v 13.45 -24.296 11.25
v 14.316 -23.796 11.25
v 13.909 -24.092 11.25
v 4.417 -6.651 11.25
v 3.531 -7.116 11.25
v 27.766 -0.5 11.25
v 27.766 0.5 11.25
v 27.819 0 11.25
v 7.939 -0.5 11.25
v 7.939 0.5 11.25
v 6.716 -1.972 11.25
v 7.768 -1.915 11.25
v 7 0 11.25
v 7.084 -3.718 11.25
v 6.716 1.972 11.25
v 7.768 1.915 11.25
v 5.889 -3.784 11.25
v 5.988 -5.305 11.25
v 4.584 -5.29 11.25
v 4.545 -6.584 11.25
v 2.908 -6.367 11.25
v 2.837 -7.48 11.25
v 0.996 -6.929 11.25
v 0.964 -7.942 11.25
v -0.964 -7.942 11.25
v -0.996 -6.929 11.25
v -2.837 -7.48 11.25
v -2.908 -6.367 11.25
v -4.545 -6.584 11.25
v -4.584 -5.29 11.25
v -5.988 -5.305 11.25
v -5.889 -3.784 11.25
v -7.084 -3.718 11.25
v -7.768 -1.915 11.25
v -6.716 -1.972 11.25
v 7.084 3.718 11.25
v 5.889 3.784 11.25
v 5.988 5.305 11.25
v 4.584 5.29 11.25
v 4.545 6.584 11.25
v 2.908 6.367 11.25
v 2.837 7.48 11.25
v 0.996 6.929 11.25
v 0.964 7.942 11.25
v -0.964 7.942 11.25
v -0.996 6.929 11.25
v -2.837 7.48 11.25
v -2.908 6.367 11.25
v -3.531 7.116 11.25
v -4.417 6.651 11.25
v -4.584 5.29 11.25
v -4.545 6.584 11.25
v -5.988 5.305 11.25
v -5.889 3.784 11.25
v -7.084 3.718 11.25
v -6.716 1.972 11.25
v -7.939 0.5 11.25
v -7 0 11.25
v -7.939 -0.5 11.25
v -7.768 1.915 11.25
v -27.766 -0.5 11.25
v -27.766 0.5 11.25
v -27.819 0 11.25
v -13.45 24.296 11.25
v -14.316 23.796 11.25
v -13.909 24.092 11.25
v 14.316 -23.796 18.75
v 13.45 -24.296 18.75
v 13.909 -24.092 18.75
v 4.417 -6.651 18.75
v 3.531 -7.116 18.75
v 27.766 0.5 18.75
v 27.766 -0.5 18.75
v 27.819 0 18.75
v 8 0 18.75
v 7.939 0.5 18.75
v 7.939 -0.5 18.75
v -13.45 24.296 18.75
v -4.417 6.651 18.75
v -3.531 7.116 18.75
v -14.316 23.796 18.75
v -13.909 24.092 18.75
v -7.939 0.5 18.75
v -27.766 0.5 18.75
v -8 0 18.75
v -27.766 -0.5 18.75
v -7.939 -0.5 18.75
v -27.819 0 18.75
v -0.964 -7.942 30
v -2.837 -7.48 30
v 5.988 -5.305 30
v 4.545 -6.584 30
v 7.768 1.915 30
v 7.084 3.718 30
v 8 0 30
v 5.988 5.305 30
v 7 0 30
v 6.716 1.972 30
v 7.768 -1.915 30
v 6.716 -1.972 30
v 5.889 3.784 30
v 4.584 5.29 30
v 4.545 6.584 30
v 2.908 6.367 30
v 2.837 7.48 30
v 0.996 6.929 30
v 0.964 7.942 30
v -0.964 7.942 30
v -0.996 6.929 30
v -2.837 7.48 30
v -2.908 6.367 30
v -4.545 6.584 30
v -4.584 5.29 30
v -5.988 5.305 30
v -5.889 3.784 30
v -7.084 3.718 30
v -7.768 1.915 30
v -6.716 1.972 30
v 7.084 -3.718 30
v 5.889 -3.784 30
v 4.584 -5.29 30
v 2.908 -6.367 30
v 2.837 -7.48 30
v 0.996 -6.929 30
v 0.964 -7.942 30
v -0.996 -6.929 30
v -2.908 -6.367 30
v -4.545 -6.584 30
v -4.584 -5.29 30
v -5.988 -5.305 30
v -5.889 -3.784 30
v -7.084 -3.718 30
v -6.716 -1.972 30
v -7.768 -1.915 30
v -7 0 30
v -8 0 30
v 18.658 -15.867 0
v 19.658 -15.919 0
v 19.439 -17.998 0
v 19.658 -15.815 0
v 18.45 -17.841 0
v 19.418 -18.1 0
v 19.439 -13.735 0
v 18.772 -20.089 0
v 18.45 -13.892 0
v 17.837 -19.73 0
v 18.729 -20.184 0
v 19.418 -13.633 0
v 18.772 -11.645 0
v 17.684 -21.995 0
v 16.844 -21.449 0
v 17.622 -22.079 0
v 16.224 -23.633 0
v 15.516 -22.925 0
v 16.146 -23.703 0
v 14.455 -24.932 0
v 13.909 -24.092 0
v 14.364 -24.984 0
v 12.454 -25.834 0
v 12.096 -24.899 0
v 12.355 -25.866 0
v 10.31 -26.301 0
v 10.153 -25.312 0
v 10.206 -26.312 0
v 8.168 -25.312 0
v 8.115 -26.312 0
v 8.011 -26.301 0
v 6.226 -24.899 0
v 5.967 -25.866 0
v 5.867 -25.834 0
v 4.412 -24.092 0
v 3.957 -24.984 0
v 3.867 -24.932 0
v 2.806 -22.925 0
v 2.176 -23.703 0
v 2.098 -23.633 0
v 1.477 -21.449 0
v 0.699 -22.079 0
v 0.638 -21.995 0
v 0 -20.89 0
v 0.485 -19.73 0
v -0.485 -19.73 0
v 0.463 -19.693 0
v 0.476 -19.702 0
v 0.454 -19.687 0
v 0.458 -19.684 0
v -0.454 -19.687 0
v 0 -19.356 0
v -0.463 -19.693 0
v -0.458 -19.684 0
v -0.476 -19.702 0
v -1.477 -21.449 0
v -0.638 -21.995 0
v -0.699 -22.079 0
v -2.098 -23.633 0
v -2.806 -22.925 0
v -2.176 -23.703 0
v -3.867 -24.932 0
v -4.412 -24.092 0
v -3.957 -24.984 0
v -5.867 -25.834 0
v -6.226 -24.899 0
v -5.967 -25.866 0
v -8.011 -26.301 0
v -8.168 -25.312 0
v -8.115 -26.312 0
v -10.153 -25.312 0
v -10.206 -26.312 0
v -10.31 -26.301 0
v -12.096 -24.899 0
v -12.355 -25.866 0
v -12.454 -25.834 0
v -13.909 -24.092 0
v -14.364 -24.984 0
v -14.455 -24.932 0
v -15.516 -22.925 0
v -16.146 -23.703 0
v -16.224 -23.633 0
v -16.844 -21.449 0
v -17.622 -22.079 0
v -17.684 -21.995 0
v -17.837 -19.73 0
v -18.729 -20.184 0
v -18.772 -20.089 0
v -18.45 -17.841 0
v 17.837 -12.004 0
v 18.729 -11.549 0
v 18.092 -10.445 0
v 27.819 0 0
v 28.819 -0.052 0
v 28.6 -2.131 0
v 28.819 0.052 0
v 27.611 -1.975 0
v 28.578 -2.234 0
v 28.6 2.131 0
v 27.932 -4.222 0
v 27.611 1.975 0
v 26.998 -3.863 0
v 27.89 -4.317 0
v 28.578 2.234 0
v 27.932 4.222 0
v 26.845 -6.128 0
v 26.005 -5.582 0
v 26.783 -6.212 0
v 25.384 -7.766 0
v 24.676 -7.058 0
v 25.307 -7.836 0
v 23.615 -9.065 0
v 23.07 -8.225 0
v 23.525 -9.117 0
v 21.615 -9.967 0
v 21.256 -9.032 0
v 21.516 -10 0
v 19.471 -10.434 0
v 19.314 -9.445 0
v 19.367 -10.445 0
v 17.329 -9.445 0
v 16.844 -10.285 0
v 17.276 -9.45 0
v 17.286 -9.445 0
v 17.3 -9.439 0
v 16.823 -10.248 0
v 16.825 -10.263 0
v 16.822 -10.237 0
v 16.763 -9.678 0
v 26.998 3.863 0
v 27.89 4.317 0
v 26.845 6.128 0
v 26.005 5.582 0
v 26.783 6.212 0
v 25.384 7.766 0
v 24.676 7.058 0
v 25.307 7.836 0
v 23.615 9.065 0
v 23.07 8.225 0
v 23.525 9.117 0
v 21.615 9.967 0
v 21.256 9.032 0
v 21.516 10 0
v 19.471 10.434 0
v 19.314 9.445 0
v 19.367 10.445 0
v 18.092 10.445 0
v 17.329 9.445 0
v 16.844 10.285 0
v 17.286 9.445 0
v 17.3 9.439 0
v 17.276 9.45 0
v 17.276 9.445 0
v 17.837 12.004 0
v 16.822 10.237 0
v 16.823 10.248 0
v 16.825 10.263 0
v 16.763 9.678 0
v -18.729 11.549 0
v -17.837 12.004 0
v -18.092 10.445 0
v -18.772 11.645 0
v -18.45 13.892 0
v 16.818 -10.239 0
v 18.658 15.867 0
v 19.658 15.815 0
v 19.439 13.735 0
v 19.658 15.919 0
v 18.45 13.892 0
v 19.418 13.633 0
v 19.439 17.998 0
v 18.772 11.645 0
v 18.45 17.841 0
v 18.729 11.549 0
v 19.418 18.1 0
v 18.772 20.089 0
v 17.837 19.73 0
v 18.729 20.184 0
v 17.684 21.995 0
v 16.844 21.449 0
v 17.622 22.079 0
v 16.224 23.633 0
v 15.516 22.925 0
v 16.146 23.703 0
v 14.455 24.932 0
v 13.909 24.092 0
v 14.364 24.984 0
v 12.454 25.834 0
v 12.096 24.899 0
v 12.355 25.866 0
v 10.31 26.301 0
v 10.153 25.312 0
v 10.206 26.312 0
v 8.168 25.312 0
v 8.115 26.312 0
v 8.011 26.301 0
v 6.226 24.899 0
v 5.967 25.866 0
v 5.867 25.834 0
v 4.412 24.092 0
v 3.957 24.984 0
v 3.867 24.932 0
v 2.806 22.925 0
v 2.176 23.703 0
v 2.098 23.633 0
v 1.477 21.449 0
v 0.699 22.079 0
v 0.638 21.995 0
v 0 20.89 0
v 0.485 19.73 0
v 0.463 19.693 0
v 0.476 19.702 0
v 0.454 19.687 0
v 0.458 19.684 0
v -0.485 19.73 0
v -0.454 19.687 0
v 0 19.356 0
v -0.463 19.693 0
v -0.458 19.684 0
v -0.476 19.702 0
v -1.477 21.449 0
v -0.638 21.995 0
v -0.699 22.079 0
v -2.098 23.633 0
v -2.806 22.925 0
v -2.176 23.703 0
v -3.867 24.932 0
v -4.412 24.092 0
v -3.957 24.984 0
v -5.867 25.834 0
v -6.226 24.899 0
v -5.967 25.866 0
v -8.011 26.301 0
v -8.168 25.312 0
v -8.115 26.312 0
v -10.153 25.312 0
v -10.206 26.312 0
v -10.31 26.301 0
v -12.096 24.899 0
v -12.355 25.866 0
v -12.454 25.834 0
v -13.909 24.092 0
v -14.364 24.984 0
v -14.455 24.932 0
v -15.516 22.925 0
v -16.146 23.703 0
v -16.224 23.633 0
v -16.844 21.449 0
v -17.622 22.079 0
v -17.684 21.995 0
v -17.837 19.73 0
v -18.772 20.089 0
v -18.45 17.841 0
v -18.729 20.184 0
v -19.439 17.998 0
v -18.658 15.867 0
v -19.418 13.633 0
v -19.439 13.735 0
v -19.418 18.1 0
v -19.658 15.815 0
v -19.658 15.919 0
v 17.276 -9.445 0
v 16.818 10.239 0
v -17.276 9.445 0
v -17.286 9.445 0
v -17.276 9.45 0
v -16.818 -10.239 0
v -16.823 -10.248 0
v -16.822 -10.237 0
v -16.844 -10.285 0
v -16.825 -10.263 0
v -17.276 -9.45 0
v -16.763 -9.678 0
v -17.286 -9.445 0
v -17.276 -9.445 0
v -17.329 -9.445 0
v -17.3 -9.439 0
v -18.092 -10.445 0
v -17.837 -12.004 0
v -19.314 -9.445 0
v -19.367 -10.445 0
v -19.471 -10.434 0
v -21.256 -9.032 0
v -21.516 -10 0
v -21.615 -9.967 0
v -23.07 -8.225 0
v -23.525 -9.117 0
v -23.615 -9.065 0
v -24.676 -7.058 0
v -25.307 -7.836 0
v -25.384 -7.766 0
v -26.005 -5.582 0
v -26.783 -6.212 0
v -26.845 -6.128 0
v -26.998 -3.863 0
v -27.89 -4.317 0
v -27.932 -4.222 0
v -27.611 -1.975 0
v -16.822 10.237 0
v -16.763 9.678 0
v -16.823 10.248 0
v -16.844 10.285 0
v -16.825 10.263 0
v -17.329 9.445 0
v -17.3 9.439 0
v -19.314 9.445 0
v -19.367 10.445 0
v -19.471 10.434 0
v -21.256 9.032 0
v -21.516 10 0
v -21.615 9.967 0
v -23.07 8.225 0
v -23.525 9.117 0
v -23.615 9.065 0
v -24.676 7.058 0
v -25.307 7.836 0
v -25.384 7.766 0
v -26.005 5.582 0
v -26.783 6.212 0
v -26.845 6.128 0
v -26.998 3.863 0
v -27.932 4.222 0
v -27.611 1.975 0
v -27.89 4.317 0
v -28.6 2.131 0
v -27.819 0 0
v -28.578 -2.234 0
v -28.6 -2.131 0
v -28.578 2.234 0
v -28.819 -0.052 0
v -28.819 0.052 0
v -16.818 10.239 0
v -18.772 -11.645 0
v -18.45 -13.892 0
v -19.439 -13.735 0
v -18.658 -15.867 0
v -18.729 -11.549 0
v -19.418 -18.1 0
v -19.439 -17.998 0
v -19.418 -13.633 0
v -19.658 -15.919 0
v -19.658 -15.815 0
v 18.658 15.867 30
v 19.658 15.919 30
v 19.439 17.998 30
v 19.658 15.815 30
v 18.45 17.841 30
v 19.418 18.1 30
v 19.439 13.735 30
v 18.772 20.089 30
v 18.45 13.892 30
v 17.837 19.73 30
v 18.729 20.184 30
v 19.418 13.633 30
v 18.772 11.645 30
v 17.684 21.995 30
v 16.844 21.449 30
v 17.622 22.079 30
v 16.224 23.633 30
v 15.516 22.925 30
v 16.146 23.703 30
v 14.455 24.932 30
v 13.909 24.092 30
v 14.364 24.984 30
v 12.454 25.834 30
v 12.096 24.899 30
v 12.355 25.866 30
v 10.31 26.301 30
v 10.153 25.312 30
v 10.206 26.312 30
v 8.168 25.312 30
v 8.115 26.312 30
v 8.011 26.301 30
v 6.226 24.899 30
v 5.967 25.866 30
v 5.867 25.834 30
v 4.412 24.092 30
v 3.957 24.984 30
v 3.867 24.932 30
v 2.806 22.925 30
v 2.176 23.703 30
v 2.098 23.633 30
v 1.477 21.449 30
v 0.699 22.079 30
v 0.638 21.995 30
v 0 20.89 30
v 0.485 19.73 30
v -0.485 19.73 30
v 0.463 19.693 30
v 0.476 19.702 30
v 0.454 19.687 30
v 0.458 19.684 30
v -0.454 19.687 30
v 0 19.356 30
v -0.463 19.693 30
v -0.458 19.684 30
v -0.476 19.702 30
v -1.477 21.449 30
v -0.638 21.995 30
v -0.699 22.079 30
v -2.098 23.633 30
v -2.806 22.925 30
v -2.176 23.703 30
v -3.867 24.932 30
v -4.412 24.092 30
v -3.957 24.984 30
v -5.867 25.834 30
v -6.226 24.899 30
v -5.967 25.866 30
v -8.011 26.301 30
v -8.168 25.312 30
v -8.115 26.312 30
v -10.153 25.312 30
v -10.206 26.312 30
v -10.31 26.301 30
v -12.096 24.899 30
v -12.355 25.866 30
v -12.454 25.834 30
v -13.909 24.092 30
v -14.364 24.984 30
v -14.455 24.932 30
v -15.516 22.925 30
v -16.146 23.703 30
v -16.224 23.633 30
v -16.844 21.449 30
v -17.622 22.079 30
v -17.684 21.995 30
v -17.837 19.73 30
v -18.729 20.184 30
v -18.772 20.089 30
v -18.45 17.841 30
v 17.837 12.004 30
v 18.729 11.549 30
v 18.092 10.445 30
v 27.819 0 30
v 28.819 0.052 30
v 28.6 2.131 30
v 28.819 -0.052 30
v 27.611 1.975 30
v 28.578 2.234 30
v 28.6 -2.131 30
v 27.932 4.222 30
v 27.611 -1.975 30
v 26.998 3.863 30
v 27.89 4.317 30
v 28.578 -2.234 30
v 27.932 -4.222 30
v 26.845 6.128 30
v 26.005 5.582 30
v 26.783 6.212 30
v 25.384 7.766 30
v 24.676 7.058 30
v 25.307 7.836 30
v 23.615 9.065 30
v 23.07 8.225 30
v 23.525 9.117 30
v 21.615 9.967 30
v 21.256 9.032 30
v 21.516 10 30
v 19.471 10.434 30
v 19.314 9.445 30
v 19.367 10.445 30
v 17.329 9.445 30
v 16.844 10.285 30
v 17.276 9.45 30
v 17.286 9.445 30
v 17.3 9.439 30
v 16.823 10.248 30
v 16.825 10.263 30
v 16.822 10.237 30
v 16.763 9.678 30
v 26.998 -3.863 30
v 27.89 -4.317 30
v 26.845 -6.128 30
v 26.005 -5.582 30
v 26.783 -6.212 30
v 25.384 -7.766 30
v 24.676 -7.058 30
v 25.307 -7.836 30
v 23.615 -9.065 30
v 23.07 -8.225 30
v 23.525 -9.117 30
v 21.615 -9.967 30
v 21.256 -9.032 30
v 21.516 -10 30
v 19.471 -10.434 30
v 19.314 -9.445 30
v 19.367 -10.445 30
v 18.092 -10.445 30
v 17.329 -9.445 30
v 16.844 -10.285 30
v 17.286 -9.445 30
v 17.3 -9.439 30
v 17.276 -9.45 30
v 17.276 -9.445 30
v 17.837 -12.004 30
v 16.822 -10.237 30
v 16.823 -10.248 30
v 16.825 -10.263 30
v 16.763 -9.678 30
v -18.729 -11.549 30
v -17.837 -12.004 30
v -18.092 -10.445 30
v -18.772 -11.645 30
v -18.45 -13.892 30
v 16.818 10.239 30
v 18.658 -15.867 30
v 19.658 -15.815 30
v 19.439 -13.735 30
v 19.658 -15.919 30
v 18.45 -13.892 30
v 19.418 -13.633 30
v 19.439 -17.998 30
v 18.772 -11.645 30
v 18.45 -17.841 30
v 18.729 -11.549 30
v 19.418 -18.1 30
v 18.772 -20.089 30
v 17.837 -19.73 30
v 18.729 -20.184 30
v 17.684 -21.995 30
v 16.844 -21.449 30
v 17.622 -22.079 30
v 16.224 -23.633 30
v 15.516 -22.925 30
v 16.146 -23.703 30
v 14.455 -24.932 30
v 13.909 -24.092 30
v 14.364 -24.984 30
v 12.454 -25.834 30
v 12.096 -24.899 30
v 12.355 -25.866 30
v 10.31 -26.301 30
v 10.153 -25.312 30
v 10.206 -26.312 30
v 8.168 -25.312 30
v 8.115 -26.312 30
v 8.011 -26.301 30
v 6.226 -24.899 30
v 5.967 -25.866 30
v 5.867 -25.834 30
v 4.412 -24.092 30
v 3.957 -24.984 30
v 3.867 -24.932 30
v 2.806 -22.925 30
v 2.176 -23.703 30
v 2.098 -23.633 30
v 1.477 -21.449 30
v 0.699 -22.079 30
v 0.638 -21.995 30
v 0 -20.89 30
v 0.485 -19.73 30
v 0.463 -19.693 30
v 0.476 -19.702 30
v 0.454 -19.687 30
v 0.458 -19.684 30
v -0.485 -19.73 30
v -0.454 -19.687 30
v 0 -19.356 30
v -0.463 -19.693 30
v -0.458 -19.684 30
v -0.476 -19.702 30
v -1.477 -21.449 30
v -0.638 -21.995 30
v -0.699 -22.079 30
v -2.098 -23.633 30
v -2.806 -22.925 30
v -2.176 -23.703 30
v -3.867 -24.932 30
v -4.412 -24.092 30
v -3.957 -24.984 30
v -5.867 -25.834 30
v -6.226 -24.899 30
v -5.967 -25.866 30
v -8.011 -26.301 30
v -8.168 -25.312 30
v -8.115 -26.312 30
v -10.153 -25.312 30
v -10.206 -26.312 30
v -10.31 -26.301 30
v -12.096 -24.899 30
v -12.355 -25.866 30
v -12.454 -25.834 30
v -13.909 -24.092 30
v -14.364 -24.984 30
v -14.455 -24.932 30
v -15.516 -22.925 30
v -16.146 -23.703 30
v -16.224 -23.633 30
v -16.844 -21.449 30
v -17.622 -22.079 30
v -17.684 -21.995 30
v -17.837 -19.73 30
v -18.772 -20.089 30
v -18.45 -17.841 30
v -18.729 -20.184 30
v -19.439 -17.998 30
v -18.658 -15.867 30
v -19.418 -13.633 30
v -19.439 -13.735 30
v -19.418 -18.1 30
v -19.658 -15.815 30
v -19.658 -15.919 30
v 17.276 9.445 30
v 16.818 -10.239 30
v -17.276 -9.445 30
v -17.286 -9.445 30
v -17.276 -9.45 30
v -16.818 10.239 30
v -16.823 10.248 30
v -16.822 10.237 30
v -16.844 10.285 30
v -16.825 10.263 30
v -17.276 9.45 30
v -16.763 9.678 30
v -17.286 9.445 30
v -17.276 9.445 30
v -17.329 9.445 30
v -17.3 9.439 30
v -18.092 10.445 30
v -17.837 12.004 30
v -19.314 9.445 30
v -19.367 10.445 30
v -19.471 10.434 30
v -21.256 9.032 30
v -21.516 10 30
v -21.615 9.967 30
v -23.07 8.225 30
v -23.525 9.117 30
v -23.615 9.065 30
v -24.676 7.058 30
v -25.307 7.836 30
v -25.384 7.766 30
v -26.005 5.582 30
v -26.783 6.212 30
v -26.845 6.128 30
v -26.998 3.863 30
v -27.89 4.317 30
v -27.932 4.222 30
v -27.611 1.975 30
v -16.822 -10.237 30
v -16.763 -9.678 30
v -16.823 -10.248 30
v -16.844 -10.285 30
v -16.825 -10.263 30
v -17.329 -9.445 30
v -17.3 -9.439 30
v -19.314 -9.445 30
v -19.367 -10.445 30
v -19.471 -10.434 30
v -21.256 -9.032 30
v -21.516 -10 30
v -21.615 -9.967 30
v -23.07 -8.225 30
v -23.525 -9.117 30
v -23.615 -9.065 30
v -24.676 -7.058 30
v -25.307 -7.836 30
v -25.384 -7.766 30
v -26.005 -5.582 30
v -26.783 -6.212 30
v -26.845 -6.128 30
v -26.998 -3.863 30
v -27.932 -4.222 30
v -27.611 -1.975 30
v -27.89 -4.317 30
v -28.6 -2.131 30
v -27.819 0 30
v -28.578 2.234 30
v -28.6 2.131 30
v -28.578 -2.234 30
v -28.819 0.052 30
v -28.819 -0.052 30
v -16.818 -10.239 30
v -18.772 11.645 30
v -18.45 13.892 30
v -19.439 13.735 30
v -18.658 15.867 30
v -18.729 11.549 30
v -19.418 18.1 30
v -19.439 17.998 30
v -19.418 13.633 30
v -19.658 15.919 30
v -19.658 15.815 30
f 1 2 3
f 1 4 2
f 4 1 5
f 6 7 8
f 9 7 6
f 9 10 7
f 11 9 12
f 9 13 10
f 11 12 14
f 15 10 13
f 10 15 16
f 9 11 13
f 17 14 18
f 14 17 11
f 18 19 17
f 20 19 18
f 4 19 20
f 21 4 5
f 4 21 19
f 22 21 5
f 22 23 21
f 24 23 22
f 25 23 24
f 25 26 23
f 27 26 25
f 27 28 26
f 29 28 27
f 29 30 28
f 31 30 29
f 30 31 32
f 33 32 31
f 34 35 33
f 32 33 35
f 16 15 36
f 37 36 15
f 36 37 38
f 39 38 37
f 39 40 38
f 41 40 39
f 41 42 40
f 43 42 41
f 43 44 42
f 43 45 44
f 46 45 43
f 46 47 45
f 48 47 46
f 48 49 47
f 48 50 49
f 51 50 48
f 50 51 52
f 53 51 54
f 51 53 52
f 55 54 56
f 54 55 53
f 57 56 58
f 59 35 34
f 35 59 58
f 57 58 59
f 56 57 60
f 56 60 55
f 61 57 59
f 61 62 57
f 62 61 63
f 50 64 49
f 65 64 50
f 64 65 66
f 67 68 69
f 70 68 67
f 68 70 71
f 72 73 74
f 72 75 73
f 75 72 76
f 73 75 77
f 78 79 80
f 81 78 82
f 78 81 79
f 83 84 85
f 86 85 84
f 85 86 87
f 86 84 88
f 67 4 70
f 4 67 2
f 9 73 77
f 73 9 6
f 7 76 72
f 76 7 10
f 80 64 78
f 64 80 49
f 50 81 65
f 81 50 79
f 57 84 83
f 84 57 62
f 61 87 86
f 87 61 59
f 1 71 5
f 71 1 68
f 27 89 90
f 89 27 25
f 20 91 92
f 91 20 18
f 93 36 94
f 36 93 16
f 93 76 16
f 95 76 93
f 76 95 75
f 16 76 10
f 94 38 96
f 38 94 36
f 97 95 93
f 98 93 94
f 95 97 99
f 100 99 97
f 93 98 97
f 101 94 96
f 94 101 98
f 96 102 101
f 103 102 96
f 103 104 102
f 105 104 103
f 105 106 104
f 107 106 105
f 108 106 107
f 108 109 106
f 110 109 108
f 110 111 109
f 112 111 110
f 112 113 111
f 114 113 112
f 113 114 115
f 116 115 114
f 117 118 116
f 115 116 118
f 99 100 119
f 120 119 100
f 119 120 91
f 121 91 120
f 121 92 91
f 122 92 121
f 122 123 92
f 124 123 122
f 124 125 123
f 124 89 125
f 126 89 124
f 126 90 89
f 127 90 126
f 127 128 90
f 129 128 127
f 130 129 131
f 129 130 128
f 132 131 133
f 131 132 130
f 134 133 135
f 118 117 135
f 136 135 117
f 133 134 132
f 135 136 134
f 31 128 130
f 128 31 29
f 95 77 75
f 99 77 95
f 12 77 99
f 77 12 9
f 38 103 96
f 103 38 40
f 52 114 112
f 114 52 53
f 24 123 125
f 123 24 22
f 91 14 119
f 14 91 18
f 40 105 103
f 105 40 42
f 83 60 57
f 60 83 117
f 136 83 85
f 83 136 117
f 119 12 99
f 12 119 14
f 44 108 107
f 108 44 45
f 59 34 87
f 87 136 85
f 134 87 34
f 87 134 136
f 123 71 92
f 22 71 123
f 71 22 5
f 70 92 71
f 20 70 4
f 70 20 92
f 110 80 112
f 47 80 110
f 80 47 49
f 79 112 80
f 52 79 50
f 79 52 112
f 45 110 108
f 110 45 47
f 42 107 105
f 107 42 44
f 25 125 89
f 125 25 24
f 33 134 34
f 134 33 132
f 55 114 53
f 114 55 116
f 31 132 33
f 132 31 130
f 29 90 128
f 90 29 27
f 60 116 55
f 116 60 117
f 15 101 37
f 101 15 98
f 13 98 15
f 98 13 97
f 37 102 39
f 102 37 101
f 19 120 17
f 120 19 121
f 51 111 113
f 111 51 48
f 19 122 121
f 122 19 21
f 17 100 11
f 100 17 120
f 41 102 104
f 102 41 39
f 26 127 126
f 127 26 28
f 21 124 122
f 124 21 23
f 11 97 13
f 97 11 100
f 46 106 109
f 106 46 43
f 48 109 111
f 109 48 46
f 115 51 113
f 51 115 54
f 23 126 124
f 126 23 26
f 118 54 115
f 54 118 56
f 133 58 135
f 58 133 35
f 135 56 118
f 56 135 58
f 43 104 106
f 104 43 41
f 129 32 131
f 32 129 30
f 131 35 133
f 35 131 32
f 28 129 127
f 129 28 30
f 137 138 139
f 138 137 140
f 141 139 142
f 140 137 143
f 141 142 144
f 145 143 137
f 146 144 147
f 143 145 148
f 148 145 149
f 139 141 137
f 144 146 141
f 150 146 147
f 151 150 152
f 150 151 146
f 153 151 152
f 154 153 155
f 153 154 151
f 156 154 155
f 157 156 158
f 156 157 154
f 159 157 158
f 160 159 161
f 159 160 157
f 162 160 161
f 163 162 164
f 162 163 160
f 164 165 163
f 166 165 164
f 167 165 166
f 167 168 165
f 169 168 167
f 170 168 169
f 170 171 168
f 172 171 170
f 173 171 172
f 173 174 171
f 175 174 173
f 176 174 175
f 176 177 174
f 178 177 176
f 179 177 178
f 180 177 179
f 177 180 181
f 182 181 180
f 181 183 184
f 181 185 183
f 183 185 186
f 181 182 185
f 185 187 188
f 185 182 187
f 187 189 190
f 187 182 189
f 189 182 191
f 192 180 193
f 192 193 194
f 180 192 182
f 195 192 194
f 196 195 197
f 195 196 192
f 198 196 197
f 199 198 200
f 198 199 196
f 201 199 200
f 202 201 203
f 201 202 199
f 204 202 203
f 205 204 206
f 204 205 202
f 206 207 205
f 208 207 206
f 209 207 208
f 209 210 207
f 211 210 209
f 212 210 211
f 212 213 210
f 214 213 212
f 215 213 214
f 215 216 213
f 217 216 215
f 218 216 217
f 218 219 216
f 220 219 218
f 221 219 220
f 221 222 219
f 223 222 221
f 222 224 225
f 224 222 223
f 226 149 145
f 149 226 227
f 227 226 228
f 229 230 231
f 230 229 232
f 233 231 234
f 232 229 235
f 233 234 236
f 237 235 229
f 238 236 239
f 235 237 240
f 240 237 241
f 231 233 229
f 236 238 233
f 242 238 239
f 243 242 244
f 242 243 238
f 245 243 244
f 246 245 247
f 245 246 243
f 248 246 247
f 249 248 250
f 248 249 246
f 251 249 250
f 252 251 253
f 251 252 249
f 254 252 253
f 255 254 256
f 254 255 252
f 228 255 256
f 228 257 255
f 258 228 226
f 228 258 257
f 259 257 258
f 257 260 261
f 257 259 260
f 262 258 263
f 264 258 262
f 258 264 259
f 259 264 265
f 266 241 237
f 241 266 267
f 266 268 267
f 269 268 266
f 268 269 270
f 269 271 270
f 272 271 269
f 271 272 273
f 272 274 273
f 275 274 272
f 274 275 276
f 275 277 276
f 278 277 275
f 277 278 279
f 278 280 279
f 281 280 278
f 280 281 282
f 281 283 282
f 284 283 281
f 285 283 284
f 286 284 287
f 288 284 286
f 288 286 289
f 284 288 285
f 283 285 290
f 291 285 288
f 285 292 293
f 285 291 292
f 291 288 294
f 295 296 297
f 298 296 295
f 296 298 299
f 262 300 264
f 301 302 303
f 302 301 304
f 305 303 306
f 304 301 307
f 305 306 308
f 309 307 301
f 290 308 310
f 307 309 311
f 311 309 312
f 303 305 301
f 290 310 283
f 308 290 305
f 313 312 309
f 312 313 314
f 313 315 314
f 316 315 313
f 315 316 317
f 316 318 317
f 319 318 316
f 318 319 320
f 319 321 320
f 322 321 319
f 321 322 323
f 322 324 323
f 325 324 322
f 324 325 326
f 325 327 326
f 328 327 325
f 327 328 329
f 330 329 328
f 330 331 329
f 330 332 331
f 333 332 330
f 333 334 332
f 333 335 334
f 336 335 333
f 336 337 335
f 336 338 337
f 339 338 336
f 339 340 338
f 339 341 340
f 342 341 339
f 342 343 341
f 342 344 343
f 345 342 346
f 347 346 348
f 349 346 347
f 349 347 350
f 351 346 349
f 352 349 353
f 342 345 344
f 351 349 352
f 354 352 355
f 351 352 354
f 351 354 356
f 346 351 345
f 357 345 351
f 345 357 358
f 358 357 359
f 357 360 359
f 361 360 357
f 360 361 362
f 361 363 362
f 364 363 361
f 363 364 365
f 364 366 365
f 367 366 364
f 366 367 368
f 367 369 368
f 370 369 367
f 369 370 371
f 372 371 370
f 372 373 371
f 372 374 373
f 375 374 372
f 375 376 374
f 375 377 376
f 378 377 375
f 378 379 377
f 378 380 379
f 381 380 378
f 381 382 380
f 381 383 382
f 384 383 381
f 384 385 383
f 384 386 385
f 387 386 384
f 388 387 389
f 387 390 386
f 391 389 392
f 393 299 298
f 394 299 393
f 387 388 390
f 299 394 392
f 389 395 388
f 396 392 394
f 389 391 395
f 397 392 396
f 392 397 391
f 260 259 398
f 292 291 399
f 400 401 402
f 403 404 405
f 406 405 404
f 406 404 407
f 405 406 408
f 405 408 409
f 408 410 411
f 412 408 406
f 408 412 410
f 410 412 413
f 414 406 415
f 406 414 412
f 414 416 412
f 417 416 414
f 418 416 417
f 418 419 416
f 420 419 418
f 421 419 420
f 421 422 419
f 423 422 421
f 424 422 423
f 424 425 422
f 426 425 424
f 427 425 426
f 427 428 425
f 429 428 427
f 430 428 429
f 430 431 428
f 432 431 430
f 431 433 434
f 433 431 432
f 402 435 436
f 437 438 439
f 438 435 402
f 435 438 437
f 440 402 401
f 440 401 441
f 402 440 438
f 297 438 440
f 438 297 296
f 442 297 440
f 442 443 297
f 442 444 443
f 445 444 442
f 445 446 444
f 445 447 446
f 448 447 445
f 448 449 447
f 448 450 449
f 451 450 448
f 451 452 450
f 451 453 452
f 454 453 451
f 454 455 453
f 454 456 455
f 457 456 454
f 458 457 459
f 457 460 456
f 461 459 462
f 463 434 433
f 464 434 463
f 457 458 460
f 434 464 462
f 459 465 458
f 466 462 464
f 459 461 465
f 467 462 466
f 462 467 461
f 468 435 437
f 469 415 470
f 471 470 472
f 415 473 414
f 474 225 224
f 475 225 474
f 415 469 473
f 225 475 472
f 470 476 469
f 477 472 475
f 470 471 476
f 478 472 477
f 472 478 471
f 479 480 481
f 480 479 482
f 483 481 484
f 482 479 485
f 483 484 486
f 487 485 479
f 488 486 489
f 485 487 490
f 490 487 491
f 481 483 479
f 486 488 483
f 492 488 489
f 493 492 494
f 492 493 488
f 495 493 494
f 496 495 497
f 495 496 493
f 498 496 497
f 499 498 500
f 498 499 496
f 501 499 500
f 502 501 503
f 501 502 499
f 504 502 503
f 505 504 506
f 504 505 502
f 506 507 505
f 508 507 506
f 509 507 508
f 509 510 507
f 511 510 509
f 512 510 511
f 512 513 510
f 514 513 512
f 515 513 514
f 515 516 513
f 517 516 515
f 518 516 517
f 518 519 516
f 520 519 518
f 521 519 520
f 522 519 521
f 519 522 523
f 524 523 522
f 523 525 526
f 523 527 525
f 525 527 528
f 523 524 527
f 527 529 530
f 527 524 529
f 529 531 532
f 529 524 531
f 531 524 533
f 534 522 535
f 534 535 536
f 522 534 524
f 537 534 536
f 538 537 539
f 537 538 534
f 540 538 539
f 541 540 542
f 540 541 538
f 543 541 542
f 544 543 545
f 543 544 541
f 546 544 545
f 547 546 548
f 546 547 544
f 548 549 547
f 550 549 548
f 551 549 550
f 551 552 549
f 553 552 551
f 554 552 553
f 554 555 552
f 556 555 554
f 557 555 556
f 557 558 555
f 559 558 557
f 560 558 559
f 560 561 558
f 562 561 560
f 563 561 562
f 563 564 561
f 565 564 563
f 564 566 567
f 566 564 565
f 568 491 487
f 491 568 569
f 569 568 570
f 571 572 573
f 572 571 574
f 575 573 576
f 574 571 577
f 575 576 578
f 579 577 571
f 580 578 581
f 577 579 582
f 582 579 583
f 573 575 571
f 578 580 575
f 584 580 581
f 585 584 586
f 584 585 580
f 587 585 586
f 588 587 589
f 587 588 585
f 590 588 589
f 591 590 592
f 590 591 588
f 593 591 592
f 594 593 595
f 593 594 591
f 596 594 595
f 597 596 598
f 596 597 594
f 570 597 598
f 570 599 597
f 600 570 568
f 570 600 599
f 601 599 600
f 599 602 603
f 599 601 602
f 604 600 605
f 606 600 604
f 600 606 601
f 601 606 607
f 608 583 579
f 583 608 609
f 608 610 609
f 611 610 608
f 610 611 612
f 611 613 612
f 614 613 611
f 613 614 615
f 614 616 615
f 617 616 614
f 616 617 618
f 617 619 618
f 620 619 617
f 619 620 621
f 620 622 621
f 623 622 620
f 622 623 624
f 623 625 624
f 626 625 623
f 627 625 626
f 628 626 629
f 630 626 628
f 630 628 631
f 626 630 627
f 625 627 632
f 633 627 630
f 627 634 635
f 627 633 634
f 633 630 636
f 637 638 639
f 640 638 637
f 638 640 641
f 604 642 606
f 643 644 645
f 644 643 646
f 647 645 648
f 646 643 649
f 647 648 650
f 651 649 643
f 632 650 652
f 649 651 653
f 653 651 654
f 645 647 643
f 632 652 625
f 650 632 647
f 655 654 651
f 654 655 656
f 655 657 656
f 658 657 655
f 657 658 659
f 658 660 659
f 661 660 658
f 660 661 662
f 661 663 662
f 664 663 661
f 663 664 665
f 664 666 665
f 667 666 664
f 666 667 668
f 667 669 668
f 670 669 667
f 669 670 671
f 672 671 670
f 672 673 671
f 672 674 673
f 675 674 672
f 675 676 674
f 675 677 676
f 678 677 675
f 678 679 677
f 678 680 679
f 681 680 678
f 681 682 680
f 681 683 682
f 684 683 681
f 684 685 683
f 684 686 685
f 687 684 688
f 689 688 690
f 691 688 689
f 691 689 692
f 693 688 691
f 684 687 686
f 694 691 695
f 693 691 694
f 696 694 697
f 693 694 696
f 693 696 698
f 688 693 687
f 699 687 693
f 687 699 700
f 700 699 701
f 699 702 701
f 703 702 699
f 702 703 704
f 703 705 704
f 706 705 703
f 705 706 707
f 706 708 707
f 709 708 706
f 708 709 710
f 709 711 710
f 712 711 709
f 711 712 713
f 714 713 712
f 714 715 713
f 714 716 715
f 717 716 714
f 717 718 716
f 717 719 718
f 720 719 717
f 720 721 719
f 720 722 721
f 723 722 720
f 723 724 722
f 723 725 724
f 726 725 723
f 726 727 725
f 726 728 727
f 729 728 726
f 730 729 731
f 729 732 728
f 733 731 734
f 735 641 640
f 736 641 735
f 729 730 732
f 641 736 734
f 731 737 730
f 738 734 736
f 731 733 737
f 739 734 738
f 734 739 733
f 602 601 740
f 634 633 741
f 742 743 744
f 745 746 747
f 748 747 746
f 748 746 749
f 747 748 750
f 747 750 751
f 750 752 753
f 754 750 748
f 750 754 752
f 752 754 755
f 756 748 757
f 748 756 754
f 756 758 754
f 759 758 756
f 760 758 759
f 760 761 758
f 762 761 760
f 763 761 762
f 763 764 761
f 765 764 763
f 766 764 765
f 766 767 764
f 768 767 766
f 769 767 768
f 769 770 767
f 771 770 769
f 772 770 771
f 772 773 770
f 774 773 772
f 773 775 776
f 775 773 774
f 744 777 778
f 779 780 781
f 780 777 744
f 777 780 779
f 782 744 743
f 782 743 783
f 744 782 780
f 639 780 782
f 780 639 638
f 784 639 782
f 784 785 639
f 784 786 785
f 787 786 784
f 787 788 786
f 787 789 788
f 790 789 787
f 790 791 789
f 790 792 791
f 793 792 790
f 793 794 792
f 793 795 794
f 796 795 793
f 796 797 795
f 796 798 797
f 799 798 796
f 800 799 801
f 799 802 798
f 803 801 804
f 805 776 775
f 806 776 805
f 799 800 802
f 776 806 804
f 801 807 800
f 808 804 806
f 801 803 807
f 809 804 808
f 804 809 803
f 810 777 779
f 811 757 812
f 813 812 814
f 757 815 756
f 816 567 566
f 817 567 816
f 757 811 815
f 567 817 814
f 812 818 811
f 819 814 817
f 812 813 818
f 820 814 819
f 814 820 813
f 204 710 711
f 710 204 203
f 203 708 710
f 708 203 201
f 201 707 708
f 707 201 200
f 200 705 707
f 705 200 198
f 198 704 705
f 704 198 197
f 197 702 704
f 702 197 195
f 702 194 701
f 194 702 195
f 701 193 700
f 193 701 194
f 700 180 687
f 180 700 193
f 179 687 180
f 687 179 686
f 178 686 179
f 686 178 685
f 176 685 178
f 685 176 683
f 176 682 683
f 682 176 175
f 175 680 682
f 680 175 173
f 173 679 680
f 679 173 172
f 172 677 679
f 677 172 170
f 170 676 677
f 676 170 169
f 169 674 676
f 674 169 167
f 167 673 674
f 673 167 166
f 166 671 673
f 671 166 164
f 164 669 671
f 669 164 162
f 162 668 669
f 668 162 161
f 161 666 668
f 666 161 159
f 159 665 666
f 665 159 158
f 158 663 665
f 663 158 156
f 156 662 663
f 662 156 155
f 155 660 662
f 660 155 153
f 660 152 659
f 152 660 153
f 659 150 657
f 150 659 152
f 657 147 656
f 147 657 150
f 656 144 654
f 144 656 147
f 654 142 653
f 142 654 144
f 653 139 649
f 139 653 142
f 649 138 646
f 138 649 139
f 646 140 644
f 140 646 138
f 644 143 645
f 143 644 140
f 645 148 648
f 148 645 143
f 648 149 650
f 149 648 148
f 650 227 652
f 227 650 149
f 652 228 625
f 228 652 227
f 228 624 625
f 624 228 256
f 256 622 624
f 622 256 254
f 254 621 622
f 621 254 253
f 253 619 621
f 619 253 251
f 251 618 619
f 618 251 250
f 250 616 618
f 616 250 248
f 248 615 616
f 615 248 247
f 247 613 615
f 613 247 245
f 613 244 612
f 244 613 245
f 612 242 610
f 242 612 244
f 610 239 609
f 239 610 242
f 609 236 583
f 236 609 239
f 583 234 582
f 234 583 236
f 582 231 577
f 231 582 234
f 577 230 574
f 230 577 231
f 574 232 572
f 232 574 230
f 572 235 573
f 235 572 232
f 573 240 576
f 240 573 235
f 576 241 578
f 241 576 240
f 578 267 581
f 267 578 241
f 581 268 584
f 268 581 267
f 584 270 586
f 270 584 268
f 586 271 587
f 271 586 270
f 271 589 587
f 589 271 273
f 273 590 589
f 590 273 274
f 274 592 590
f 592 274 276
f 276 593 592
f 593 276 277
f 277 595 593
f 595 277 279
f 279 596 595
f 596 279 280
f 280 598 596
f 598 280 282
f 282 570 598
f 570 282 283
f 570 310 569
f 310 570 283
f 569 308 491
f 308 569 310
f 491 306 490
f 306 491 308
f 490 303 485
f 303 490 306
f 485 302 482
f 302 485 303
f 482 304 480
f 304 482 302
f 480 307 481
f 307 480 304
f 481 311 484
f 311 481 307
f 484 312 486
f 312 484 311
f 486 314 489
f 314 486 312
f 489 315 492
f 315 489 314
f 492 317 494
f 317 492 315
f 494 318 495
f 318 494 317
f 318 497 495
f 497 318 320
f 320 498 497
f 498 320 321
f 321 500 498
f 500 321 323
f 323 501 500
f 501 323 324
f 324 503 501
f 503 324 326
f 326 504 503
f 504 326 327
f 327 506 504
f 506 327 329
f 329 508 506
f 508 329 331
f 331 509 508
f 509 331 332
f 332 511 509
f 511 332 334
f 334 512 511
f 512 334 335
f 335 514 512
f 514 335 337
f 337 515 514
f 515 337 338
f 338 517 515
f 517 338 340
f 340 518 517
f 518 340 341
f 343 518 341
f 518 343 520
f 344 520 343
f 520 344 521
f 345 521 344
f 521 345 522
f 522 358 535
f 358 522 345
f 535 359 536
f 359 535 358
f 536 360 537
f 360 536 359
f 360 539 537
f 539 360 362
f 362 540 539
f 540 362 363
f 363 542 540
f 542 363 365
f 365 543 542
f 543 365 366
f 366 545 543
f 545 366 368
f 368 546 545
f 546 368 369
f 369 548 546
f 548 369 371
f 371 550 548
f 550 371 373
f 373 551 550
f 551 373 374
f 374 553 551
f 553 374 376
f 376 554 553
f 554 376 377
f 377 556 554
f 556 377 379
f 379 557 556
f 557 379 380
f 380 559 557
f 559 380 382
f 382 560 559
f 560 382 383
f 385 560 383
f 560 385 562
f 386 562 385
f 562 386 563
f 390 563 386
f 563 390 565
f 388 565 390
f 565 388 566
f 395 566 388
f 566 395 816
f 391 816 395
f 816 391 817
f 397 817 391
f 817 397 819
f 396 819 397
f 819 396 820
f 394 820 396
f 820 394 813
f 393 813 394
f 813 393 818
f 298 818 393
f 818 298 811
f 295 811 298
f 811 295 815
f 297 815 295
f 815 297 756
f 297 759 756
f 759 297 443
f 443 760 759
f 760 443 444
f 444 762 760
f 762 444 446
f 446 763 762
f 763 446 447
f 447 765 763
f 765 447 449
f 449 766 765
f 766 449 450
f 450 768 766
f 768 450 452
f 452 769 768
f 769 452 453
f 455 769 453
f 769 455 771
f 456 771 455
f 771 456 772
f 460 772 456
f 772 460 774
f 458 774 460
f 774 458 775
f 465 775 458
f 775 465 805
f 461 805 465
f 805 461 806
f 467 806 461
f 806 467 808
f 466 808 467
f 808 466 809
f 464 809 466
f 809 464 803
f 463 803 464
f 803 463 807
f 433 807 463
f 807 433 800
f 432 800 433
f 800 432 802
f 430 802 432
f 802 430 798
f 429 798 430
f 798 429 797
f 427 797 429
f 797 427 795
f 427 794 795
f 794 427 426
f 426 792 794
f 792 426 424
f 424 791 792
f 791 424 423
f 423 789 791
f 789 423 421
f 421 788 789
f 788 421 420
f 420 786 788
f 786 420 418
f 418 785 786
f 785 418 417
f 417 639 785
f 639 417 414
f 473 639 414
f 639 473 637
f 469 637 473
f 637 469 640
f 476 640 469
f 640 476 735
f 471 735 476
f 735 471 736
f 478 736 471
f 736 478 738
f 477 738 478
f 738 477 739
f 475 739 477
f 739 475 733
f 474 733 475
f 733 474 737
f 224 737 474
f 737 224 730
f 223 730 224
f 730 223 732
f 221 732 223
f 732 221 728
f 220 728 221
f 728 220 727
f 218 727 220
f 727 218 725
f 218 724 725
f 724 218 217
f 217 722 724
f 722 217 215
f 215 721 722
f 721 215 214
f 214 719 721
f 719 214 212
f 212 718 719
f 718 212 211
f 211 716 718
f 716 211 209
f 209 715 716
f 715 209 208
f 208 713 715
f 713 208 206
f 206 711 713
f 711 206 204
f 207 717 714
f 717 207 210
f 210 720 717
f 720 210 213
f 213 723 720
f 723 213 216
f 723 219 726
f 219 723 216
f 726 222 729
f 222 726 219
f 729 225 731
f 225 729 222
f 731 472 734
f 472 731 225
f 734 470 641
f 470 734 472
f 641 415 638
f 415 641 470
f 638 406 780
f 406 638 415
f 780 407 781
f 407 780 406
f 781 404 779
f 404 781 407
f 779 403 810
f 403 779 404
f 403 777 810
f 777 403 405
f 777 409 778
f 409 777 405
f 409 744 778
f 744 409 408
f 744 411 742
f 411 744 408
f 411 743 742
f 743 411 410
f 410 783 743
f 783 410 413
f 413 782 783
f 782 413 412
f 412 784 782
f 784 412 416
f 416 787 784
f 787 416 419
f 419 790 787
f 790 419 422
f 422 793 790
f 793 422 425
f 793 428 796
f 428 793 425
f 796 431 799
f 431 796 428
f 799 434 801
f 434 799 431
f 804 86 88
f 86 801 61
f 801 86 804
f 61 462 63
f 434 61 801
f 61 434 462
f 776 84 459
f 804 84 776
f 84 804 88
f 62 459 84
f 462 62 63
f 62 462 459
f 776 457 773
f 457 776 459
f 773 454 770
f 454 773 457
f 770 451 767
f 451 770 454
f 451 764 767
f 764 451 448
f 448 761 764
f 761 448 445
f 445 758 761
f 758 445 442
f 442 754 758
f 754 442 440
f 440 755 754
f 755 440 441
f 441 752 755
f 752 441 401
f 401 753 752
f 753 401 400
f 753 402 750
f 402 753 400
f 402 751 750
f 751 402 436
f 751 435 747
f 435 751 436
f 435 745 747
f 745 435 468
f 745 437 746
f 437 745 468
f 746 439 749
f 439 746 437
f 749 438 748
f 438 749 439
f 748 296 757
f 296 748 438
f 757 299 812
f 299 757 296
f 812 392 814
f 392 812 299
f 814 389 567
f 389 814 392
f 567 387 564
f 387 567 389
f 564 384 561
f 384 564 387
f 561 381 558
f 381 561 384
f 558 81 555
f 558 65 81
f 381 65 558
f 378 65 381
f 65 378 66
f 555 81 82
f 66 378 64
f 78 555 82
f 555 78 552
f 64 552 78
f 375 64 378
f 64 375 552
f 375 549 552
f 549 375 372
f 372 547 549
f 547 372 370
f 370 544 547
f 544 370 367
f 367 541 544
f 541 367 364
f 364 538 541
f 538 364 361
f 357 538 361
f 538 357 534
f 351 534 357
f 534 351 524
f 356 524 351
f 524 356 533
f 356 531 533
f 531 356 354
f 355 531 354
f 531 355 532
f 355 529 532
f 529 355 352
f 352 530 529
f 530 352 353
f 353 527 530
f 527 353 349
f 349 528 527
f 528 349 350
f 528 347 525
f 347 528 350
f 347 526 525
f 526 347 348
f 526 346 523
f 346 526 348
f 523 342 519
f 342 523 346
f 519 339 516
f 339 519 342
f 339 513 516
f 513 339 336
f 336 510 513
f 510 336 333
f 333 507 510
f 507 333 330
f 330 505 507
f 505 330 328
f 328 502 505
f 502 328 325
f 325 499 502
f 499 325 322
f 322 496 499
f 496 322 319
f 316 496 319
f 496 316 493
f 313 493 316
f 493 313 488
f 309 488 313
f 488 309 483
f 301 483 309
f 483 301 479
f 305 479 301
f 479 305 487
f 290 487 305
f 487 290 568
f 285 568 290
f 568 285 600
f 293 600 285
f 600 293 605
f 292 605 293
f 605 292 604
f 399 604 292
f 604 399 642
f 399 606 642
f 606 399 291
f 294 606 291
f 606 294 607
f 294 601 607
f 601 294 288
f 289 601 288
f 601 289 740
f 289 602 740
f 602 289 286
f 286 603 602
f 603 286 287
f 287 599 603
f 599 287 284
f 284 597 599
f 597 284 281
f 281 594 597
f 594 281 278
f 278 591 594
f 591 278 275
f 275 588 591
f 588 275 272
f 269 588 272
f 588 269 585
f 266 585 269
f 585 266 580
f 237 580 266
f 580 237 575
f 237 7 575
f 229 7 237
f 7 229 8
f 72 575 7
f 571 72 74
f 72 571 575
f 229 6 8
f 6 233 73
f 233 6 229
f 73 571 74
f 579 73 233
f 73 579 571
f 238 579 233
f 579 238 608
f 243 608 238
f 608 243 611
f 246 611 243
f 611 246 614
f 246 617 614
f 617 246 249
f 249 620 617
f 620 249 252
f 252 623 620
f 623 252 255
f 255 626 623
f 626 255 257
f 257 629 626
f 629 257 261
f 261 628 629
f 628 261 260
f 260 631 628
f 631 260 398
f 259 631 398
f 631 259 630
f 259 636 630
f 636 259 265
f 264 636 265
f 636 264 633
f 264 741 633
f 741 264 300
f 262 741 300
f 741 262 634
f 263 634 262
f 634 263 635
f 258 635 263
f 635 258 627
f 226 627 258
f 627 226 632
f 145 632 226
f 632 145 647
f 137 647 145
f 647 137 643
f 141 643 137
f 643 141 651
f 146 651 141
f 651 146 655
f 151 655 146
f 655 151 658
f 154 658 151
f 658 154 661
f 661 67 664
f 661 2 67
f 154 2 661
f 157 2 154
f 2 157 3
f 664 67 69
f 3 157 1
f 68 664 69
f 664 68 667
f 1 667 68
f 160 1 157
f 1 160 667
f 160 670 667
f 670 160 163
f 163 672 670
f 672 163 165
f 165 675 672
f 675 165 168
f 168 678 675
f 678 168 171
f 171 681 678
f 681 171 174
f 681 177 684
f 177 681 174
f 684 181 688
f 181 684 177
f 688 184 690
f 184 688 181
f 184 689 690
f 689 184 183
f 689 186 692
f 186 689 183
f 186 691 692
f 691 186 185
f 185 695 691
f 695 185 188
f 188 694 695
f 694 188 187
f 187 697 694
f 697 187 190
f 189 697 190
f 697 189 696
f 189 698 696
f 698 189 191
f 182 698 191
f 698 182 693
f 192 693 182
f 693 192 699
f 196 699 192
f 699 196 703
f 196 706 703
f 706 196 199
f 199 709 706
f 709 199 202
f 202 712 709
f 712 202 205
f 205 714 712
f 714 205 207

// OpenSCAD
module flower(height=1, size=4, expand=5) {
    circle(expand);
    translate(v = [expand,0,0]) circle(size);
    rotate(a = [0, 0, 60]) translate(v = [expand,0,0]) circle(size);
    rotate(a = [0, 0, 120]) translate(v = [expand,0,0]) circle(size);
    rotate(a = [0, 0, 180]) translate(v = [expand,0,0]) circle(size);
    rotate(a = [0, 0, 240]) translate(v = [expand,0,0]) circle(size);
    rotate(a = [0, 0, 300]) translate(v = [expand,0,0]) circle(size);
}

module mold(thickness = 1, radius = 10, expend = 20) {
    difference() {
        offset(r=thickness/2) {
            flower(20, radius, expand);
        };
        offset(r=-thickness/2) {
            flower(20, radius, expand);
        };
    };
}

height = 30;
factor = 1.8;
length = 57;
thickness = 1;
// expand = radius * factor
// length = radius + expand + expand + radius
// length = 2 * (radius + expand)
// length = 2 * (radius + radius * factor)
// length = 2 * radius * (1 + factor)
radius = length / ( 2 * (1 + factor) );
expand = radius * factor;
h = height / 4;

linear_extrude(height = height) {
    mold();
};

difference() {
    translate(v = [0,0,height / 2 - h / 2]) {
        linear_extrude(height = height/4) {
            rotate(a = [0, 0, 30]) {
                square(size = [ thickness, 2 * (radius + expand) ], center = true);
            };
            rotate(a = [0, 0, 90]) {
                square(size = [ thickness, 2 * (radius + expand) ], center = true);
            };
        };
        cylinder(h = height / 2 + h / 2, r1 = 8, r2 = 8);
    };
    cylinder(h = height, r1 = 8 - thickness, r2 = 8 - thickness);
};
